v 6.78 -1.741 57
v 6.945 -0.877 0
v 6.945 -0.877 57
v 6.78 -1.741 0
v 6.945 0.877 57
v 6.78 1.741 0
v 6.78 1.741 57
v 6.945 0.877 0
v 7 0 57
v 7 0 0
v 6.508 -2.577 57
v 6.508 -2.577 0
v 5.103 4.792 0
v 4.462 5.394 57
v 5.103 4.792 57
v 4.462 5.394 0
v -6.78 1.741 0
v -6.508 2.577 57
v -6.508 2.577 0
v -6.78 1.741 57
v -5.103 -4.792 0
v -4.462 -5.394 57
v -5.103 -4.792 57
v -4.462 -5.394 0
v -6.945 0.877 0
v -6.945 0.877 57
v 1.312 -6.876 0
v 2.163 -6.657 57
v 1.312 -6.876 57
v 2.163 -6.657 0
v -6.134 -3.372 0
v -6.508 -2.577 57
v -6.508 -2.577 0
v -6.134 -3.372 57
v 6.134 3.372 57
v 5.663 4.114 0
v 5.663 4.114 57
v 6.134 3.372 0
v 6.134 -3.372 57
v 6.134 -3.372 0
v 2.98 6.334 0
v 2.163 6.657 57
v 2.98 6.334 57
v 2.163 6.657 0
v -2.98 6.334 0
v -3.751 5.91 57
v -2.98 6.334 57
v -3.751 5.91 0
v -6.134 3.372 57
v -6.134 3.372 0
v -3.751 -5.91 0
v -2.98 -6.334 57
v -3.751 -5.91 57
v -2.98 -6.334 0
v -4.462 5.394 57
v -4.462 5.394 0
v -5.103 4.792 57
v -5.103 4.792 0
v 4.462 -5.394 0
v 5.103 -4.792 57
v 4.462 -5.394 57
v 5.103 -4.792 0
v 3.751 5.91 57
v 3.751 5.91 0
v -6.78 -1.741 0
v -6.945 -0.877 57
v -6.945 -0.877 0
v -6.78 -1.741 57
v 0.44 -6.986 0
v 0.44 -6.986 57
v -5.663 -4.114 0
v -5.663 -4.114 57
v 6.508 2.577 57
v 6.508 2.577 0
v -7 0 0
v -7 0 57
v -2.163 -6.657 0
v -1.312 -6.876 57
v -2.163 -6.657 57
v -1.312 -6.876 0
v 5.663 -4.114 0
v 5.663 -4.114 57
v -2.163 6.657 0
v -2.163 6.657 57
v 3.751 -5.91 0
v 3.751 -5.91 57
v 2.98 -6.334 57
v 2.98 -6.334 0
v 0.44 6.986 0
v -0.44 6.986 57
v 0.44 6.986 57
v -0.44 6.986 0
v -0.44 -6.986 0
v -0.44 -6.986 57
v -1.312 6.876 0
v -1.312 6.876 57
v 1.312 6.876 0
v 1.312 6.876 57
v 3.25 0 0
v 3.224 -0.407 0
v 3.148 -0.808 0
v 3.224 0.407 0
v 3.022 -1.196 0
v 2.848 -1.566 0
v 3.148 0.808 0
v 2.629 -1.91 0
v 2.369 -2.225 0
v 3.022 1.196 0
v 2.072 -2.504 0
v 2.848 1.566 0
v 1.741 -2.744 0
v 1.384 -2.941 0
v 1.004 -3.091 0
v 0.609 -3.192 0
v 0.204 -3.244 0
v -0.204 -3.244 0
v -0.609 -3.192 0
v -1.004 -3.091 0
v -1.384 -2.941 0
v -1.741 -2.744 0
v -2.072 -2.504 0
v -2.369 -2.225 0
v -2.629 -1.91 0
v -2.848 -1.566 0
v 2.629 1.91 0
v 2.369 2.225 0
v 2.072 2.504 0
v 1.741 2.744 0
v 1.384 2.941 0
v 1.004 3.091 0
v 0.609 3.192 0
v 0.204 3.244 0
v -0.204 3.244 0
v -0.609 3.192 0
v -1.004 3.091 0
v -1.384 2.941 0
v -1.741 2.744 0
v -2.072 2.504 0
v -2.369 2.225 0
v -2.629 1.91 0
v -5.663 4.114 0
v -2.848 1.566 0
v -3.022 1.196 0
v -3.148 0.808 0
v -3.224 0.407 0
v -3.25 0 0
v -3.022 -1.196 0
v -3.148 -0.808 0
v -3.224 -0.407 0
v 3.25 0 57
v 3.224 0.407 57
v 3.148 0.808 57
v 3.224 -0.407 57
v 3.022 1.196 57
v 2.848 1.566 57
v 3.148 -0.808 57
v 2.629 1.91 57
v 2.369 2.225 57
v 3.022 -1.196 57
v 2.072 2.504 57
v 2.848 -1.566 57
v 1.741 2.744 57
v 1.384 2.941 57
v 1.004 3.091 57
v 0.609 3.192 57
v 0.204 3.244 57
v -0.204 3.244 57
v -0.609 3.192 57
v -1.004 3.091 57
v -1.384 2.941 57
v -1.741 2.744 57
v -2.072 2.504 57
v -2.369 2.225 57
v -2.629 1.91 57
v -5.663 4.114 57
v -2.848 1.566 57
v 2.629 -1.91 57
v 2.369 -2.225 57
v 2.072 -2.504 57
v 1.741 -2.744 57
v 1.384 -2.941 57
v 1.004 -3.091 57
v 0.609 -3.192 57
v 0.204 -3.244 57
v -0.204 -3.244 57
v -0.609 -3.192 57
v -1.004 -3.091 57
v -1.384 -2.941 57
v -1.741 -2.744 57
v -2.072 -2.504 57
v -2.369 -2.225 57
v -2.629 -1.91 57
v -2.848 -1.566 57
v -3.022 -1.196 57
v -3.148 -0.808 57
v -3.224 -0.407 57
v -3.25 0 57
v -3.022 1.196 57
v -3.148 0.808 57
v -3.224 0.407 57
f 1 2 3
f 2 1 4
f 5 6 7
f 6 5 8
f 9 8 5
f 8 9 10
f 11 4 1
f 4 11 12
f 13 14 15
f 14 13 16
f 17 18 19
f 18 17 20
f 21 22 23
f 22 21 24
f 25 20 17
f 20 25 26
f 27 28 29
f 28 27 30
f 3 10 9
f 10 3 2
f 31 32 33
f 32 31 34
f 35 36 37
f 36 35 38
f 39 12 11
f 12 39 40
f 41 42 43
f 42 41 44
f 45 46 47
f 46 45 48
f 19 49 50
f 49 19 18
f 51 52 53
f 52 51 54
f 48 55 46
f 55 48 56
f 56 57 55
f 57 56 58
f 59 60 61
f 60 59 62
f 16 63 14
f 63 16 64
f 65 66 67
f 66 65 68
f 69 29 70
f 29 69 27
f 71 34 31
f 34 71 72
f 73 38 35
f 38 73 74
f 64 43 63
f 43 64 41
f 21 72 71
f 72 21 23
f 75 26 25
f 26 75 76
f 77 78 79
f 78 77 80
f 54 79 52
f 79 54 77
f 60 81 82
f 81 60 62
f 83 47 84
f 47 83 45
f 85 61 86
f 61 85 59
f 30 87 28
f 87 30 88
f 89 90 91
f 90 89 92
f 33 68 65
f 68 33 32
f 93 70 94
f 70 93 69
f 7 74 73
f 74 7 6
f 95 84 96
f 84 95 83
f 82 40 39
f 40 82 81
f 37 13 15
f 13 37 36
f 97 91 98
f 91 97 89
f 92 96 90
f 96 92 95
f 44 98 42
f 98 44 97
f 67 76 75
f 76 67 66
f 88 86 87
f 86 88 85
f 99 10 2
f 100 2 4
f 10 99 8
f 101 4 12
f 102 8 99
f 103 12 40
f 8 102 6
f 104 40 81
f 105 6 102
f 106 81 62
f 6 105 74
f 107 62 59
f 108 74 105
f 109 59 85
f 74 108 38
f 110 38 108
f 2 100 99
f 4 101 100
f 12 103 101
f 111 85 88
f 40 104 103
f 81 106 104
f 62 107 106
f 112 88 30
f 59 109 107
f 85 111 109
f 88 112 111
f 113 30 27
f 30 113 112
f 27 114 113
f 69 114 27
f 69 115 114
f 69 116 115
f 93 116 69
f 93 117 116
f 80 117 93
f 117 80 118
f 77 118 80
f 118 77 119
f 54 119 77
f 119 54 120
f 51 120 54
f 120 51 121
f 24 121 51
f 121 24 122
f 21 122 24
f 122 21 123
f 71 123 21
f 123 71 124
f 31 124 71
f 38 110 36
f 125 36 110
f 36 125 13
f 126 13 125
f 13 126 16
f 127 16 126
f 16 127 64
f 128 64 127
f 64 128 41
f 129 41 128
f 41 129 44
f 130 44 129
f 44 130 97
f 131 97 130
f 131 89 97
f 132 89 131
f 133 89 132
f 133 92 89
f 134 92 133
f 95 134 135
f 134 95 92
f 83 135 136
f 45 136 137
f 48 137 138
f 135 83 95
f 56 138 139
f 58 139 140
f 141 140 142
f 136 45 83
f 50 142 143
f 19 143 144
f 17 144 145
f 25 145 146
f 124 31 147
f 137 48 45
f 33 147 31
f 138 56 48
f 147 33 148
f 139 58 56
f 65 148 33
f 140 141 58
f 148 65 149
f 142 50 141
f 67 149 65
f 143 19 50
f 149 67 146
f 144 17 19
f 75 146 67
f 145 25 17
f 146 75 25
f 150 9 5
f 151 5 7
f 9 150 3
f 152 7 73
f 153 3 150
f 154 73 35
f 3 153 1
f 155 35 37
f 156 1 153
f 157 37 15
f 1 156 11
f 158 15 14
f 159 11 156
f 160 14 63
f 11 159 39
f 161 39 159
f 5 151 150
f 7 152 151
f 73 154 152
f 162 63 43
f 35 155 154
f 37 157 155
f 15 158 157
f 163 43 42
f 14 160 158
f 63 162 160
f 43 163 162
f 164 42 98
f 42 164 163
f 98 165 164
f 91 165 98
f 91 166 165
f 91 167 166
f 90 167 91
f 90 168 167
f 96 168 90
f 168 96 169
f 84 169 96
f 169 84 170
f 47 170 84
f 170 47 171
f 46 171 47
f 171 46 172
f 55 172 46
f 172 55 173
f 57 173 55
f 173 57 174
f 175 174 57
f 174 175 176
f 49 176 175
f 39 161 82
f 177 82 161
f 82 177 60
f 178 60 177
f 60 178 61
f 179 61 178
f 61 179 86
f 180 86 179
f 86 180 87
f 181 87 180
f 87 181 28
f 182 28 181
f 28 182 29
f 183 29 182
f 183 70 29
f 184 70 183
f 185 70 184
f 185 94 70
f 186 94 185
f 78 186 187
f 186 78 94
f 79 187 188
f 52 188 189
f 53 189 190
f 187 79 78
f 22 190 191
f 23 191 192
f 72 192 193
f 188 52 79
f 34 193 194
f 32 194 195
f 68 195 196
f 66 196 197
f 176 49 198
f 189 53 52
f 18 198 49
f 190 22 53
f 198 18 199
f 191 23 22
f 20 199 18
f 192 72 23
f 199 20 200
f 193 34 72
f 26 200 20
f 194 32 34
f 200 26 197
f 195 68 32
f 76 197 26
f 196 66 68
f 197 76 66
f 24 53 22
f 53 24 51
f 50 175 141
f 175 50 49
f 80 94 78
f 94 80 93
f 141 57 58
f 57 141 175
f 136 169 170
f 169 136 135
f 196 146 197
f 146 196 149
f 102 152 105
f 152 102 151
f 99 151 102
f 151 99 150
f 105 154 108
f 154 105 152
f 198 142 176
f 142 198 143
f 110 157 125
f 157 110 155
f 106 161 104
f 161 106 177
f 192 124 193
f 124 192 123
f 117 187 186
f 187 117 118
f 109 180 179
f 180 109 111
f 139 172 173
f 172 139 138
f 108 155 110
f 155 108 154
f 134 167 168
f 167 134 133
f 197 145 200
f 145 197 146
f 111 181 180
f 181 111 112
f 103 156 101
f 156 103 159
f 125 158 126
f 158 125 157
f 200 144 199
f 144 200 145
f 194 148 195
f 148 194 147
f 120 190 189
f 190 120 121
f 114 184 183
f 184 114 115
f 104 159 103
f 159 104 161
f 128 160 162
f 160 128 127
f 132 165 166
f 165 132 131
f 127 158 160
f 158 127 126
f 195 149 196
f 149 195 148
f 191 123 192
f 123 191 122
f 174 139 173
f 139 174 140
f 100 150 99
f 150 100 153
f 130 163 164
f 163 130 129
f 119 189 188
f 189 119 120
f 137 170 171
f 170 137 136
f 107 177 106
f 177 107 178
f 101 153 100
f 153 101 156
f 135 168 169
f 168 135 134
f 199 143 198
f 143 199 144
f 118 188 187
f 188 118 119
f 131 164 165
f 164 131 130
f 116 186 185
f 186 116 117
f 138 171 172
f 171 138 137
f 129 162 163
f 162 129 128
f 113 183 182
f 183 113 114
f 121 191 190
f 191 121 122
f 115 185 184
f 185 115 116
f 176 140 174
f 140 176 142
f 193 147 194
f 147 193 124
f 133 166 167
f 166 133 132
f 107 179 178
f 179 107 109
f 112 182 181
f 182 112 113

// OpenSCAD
$fn = 50;


difference() {
	union() {
		cylinder(h = 57, r = 7.0000000000);
	}
	union() {
		translate(v = [0.0000000000, 0.0000000000, -100.0000000000]) {
			cylinder(h = 200, r = 3.2500000000);
		}
	}
}
